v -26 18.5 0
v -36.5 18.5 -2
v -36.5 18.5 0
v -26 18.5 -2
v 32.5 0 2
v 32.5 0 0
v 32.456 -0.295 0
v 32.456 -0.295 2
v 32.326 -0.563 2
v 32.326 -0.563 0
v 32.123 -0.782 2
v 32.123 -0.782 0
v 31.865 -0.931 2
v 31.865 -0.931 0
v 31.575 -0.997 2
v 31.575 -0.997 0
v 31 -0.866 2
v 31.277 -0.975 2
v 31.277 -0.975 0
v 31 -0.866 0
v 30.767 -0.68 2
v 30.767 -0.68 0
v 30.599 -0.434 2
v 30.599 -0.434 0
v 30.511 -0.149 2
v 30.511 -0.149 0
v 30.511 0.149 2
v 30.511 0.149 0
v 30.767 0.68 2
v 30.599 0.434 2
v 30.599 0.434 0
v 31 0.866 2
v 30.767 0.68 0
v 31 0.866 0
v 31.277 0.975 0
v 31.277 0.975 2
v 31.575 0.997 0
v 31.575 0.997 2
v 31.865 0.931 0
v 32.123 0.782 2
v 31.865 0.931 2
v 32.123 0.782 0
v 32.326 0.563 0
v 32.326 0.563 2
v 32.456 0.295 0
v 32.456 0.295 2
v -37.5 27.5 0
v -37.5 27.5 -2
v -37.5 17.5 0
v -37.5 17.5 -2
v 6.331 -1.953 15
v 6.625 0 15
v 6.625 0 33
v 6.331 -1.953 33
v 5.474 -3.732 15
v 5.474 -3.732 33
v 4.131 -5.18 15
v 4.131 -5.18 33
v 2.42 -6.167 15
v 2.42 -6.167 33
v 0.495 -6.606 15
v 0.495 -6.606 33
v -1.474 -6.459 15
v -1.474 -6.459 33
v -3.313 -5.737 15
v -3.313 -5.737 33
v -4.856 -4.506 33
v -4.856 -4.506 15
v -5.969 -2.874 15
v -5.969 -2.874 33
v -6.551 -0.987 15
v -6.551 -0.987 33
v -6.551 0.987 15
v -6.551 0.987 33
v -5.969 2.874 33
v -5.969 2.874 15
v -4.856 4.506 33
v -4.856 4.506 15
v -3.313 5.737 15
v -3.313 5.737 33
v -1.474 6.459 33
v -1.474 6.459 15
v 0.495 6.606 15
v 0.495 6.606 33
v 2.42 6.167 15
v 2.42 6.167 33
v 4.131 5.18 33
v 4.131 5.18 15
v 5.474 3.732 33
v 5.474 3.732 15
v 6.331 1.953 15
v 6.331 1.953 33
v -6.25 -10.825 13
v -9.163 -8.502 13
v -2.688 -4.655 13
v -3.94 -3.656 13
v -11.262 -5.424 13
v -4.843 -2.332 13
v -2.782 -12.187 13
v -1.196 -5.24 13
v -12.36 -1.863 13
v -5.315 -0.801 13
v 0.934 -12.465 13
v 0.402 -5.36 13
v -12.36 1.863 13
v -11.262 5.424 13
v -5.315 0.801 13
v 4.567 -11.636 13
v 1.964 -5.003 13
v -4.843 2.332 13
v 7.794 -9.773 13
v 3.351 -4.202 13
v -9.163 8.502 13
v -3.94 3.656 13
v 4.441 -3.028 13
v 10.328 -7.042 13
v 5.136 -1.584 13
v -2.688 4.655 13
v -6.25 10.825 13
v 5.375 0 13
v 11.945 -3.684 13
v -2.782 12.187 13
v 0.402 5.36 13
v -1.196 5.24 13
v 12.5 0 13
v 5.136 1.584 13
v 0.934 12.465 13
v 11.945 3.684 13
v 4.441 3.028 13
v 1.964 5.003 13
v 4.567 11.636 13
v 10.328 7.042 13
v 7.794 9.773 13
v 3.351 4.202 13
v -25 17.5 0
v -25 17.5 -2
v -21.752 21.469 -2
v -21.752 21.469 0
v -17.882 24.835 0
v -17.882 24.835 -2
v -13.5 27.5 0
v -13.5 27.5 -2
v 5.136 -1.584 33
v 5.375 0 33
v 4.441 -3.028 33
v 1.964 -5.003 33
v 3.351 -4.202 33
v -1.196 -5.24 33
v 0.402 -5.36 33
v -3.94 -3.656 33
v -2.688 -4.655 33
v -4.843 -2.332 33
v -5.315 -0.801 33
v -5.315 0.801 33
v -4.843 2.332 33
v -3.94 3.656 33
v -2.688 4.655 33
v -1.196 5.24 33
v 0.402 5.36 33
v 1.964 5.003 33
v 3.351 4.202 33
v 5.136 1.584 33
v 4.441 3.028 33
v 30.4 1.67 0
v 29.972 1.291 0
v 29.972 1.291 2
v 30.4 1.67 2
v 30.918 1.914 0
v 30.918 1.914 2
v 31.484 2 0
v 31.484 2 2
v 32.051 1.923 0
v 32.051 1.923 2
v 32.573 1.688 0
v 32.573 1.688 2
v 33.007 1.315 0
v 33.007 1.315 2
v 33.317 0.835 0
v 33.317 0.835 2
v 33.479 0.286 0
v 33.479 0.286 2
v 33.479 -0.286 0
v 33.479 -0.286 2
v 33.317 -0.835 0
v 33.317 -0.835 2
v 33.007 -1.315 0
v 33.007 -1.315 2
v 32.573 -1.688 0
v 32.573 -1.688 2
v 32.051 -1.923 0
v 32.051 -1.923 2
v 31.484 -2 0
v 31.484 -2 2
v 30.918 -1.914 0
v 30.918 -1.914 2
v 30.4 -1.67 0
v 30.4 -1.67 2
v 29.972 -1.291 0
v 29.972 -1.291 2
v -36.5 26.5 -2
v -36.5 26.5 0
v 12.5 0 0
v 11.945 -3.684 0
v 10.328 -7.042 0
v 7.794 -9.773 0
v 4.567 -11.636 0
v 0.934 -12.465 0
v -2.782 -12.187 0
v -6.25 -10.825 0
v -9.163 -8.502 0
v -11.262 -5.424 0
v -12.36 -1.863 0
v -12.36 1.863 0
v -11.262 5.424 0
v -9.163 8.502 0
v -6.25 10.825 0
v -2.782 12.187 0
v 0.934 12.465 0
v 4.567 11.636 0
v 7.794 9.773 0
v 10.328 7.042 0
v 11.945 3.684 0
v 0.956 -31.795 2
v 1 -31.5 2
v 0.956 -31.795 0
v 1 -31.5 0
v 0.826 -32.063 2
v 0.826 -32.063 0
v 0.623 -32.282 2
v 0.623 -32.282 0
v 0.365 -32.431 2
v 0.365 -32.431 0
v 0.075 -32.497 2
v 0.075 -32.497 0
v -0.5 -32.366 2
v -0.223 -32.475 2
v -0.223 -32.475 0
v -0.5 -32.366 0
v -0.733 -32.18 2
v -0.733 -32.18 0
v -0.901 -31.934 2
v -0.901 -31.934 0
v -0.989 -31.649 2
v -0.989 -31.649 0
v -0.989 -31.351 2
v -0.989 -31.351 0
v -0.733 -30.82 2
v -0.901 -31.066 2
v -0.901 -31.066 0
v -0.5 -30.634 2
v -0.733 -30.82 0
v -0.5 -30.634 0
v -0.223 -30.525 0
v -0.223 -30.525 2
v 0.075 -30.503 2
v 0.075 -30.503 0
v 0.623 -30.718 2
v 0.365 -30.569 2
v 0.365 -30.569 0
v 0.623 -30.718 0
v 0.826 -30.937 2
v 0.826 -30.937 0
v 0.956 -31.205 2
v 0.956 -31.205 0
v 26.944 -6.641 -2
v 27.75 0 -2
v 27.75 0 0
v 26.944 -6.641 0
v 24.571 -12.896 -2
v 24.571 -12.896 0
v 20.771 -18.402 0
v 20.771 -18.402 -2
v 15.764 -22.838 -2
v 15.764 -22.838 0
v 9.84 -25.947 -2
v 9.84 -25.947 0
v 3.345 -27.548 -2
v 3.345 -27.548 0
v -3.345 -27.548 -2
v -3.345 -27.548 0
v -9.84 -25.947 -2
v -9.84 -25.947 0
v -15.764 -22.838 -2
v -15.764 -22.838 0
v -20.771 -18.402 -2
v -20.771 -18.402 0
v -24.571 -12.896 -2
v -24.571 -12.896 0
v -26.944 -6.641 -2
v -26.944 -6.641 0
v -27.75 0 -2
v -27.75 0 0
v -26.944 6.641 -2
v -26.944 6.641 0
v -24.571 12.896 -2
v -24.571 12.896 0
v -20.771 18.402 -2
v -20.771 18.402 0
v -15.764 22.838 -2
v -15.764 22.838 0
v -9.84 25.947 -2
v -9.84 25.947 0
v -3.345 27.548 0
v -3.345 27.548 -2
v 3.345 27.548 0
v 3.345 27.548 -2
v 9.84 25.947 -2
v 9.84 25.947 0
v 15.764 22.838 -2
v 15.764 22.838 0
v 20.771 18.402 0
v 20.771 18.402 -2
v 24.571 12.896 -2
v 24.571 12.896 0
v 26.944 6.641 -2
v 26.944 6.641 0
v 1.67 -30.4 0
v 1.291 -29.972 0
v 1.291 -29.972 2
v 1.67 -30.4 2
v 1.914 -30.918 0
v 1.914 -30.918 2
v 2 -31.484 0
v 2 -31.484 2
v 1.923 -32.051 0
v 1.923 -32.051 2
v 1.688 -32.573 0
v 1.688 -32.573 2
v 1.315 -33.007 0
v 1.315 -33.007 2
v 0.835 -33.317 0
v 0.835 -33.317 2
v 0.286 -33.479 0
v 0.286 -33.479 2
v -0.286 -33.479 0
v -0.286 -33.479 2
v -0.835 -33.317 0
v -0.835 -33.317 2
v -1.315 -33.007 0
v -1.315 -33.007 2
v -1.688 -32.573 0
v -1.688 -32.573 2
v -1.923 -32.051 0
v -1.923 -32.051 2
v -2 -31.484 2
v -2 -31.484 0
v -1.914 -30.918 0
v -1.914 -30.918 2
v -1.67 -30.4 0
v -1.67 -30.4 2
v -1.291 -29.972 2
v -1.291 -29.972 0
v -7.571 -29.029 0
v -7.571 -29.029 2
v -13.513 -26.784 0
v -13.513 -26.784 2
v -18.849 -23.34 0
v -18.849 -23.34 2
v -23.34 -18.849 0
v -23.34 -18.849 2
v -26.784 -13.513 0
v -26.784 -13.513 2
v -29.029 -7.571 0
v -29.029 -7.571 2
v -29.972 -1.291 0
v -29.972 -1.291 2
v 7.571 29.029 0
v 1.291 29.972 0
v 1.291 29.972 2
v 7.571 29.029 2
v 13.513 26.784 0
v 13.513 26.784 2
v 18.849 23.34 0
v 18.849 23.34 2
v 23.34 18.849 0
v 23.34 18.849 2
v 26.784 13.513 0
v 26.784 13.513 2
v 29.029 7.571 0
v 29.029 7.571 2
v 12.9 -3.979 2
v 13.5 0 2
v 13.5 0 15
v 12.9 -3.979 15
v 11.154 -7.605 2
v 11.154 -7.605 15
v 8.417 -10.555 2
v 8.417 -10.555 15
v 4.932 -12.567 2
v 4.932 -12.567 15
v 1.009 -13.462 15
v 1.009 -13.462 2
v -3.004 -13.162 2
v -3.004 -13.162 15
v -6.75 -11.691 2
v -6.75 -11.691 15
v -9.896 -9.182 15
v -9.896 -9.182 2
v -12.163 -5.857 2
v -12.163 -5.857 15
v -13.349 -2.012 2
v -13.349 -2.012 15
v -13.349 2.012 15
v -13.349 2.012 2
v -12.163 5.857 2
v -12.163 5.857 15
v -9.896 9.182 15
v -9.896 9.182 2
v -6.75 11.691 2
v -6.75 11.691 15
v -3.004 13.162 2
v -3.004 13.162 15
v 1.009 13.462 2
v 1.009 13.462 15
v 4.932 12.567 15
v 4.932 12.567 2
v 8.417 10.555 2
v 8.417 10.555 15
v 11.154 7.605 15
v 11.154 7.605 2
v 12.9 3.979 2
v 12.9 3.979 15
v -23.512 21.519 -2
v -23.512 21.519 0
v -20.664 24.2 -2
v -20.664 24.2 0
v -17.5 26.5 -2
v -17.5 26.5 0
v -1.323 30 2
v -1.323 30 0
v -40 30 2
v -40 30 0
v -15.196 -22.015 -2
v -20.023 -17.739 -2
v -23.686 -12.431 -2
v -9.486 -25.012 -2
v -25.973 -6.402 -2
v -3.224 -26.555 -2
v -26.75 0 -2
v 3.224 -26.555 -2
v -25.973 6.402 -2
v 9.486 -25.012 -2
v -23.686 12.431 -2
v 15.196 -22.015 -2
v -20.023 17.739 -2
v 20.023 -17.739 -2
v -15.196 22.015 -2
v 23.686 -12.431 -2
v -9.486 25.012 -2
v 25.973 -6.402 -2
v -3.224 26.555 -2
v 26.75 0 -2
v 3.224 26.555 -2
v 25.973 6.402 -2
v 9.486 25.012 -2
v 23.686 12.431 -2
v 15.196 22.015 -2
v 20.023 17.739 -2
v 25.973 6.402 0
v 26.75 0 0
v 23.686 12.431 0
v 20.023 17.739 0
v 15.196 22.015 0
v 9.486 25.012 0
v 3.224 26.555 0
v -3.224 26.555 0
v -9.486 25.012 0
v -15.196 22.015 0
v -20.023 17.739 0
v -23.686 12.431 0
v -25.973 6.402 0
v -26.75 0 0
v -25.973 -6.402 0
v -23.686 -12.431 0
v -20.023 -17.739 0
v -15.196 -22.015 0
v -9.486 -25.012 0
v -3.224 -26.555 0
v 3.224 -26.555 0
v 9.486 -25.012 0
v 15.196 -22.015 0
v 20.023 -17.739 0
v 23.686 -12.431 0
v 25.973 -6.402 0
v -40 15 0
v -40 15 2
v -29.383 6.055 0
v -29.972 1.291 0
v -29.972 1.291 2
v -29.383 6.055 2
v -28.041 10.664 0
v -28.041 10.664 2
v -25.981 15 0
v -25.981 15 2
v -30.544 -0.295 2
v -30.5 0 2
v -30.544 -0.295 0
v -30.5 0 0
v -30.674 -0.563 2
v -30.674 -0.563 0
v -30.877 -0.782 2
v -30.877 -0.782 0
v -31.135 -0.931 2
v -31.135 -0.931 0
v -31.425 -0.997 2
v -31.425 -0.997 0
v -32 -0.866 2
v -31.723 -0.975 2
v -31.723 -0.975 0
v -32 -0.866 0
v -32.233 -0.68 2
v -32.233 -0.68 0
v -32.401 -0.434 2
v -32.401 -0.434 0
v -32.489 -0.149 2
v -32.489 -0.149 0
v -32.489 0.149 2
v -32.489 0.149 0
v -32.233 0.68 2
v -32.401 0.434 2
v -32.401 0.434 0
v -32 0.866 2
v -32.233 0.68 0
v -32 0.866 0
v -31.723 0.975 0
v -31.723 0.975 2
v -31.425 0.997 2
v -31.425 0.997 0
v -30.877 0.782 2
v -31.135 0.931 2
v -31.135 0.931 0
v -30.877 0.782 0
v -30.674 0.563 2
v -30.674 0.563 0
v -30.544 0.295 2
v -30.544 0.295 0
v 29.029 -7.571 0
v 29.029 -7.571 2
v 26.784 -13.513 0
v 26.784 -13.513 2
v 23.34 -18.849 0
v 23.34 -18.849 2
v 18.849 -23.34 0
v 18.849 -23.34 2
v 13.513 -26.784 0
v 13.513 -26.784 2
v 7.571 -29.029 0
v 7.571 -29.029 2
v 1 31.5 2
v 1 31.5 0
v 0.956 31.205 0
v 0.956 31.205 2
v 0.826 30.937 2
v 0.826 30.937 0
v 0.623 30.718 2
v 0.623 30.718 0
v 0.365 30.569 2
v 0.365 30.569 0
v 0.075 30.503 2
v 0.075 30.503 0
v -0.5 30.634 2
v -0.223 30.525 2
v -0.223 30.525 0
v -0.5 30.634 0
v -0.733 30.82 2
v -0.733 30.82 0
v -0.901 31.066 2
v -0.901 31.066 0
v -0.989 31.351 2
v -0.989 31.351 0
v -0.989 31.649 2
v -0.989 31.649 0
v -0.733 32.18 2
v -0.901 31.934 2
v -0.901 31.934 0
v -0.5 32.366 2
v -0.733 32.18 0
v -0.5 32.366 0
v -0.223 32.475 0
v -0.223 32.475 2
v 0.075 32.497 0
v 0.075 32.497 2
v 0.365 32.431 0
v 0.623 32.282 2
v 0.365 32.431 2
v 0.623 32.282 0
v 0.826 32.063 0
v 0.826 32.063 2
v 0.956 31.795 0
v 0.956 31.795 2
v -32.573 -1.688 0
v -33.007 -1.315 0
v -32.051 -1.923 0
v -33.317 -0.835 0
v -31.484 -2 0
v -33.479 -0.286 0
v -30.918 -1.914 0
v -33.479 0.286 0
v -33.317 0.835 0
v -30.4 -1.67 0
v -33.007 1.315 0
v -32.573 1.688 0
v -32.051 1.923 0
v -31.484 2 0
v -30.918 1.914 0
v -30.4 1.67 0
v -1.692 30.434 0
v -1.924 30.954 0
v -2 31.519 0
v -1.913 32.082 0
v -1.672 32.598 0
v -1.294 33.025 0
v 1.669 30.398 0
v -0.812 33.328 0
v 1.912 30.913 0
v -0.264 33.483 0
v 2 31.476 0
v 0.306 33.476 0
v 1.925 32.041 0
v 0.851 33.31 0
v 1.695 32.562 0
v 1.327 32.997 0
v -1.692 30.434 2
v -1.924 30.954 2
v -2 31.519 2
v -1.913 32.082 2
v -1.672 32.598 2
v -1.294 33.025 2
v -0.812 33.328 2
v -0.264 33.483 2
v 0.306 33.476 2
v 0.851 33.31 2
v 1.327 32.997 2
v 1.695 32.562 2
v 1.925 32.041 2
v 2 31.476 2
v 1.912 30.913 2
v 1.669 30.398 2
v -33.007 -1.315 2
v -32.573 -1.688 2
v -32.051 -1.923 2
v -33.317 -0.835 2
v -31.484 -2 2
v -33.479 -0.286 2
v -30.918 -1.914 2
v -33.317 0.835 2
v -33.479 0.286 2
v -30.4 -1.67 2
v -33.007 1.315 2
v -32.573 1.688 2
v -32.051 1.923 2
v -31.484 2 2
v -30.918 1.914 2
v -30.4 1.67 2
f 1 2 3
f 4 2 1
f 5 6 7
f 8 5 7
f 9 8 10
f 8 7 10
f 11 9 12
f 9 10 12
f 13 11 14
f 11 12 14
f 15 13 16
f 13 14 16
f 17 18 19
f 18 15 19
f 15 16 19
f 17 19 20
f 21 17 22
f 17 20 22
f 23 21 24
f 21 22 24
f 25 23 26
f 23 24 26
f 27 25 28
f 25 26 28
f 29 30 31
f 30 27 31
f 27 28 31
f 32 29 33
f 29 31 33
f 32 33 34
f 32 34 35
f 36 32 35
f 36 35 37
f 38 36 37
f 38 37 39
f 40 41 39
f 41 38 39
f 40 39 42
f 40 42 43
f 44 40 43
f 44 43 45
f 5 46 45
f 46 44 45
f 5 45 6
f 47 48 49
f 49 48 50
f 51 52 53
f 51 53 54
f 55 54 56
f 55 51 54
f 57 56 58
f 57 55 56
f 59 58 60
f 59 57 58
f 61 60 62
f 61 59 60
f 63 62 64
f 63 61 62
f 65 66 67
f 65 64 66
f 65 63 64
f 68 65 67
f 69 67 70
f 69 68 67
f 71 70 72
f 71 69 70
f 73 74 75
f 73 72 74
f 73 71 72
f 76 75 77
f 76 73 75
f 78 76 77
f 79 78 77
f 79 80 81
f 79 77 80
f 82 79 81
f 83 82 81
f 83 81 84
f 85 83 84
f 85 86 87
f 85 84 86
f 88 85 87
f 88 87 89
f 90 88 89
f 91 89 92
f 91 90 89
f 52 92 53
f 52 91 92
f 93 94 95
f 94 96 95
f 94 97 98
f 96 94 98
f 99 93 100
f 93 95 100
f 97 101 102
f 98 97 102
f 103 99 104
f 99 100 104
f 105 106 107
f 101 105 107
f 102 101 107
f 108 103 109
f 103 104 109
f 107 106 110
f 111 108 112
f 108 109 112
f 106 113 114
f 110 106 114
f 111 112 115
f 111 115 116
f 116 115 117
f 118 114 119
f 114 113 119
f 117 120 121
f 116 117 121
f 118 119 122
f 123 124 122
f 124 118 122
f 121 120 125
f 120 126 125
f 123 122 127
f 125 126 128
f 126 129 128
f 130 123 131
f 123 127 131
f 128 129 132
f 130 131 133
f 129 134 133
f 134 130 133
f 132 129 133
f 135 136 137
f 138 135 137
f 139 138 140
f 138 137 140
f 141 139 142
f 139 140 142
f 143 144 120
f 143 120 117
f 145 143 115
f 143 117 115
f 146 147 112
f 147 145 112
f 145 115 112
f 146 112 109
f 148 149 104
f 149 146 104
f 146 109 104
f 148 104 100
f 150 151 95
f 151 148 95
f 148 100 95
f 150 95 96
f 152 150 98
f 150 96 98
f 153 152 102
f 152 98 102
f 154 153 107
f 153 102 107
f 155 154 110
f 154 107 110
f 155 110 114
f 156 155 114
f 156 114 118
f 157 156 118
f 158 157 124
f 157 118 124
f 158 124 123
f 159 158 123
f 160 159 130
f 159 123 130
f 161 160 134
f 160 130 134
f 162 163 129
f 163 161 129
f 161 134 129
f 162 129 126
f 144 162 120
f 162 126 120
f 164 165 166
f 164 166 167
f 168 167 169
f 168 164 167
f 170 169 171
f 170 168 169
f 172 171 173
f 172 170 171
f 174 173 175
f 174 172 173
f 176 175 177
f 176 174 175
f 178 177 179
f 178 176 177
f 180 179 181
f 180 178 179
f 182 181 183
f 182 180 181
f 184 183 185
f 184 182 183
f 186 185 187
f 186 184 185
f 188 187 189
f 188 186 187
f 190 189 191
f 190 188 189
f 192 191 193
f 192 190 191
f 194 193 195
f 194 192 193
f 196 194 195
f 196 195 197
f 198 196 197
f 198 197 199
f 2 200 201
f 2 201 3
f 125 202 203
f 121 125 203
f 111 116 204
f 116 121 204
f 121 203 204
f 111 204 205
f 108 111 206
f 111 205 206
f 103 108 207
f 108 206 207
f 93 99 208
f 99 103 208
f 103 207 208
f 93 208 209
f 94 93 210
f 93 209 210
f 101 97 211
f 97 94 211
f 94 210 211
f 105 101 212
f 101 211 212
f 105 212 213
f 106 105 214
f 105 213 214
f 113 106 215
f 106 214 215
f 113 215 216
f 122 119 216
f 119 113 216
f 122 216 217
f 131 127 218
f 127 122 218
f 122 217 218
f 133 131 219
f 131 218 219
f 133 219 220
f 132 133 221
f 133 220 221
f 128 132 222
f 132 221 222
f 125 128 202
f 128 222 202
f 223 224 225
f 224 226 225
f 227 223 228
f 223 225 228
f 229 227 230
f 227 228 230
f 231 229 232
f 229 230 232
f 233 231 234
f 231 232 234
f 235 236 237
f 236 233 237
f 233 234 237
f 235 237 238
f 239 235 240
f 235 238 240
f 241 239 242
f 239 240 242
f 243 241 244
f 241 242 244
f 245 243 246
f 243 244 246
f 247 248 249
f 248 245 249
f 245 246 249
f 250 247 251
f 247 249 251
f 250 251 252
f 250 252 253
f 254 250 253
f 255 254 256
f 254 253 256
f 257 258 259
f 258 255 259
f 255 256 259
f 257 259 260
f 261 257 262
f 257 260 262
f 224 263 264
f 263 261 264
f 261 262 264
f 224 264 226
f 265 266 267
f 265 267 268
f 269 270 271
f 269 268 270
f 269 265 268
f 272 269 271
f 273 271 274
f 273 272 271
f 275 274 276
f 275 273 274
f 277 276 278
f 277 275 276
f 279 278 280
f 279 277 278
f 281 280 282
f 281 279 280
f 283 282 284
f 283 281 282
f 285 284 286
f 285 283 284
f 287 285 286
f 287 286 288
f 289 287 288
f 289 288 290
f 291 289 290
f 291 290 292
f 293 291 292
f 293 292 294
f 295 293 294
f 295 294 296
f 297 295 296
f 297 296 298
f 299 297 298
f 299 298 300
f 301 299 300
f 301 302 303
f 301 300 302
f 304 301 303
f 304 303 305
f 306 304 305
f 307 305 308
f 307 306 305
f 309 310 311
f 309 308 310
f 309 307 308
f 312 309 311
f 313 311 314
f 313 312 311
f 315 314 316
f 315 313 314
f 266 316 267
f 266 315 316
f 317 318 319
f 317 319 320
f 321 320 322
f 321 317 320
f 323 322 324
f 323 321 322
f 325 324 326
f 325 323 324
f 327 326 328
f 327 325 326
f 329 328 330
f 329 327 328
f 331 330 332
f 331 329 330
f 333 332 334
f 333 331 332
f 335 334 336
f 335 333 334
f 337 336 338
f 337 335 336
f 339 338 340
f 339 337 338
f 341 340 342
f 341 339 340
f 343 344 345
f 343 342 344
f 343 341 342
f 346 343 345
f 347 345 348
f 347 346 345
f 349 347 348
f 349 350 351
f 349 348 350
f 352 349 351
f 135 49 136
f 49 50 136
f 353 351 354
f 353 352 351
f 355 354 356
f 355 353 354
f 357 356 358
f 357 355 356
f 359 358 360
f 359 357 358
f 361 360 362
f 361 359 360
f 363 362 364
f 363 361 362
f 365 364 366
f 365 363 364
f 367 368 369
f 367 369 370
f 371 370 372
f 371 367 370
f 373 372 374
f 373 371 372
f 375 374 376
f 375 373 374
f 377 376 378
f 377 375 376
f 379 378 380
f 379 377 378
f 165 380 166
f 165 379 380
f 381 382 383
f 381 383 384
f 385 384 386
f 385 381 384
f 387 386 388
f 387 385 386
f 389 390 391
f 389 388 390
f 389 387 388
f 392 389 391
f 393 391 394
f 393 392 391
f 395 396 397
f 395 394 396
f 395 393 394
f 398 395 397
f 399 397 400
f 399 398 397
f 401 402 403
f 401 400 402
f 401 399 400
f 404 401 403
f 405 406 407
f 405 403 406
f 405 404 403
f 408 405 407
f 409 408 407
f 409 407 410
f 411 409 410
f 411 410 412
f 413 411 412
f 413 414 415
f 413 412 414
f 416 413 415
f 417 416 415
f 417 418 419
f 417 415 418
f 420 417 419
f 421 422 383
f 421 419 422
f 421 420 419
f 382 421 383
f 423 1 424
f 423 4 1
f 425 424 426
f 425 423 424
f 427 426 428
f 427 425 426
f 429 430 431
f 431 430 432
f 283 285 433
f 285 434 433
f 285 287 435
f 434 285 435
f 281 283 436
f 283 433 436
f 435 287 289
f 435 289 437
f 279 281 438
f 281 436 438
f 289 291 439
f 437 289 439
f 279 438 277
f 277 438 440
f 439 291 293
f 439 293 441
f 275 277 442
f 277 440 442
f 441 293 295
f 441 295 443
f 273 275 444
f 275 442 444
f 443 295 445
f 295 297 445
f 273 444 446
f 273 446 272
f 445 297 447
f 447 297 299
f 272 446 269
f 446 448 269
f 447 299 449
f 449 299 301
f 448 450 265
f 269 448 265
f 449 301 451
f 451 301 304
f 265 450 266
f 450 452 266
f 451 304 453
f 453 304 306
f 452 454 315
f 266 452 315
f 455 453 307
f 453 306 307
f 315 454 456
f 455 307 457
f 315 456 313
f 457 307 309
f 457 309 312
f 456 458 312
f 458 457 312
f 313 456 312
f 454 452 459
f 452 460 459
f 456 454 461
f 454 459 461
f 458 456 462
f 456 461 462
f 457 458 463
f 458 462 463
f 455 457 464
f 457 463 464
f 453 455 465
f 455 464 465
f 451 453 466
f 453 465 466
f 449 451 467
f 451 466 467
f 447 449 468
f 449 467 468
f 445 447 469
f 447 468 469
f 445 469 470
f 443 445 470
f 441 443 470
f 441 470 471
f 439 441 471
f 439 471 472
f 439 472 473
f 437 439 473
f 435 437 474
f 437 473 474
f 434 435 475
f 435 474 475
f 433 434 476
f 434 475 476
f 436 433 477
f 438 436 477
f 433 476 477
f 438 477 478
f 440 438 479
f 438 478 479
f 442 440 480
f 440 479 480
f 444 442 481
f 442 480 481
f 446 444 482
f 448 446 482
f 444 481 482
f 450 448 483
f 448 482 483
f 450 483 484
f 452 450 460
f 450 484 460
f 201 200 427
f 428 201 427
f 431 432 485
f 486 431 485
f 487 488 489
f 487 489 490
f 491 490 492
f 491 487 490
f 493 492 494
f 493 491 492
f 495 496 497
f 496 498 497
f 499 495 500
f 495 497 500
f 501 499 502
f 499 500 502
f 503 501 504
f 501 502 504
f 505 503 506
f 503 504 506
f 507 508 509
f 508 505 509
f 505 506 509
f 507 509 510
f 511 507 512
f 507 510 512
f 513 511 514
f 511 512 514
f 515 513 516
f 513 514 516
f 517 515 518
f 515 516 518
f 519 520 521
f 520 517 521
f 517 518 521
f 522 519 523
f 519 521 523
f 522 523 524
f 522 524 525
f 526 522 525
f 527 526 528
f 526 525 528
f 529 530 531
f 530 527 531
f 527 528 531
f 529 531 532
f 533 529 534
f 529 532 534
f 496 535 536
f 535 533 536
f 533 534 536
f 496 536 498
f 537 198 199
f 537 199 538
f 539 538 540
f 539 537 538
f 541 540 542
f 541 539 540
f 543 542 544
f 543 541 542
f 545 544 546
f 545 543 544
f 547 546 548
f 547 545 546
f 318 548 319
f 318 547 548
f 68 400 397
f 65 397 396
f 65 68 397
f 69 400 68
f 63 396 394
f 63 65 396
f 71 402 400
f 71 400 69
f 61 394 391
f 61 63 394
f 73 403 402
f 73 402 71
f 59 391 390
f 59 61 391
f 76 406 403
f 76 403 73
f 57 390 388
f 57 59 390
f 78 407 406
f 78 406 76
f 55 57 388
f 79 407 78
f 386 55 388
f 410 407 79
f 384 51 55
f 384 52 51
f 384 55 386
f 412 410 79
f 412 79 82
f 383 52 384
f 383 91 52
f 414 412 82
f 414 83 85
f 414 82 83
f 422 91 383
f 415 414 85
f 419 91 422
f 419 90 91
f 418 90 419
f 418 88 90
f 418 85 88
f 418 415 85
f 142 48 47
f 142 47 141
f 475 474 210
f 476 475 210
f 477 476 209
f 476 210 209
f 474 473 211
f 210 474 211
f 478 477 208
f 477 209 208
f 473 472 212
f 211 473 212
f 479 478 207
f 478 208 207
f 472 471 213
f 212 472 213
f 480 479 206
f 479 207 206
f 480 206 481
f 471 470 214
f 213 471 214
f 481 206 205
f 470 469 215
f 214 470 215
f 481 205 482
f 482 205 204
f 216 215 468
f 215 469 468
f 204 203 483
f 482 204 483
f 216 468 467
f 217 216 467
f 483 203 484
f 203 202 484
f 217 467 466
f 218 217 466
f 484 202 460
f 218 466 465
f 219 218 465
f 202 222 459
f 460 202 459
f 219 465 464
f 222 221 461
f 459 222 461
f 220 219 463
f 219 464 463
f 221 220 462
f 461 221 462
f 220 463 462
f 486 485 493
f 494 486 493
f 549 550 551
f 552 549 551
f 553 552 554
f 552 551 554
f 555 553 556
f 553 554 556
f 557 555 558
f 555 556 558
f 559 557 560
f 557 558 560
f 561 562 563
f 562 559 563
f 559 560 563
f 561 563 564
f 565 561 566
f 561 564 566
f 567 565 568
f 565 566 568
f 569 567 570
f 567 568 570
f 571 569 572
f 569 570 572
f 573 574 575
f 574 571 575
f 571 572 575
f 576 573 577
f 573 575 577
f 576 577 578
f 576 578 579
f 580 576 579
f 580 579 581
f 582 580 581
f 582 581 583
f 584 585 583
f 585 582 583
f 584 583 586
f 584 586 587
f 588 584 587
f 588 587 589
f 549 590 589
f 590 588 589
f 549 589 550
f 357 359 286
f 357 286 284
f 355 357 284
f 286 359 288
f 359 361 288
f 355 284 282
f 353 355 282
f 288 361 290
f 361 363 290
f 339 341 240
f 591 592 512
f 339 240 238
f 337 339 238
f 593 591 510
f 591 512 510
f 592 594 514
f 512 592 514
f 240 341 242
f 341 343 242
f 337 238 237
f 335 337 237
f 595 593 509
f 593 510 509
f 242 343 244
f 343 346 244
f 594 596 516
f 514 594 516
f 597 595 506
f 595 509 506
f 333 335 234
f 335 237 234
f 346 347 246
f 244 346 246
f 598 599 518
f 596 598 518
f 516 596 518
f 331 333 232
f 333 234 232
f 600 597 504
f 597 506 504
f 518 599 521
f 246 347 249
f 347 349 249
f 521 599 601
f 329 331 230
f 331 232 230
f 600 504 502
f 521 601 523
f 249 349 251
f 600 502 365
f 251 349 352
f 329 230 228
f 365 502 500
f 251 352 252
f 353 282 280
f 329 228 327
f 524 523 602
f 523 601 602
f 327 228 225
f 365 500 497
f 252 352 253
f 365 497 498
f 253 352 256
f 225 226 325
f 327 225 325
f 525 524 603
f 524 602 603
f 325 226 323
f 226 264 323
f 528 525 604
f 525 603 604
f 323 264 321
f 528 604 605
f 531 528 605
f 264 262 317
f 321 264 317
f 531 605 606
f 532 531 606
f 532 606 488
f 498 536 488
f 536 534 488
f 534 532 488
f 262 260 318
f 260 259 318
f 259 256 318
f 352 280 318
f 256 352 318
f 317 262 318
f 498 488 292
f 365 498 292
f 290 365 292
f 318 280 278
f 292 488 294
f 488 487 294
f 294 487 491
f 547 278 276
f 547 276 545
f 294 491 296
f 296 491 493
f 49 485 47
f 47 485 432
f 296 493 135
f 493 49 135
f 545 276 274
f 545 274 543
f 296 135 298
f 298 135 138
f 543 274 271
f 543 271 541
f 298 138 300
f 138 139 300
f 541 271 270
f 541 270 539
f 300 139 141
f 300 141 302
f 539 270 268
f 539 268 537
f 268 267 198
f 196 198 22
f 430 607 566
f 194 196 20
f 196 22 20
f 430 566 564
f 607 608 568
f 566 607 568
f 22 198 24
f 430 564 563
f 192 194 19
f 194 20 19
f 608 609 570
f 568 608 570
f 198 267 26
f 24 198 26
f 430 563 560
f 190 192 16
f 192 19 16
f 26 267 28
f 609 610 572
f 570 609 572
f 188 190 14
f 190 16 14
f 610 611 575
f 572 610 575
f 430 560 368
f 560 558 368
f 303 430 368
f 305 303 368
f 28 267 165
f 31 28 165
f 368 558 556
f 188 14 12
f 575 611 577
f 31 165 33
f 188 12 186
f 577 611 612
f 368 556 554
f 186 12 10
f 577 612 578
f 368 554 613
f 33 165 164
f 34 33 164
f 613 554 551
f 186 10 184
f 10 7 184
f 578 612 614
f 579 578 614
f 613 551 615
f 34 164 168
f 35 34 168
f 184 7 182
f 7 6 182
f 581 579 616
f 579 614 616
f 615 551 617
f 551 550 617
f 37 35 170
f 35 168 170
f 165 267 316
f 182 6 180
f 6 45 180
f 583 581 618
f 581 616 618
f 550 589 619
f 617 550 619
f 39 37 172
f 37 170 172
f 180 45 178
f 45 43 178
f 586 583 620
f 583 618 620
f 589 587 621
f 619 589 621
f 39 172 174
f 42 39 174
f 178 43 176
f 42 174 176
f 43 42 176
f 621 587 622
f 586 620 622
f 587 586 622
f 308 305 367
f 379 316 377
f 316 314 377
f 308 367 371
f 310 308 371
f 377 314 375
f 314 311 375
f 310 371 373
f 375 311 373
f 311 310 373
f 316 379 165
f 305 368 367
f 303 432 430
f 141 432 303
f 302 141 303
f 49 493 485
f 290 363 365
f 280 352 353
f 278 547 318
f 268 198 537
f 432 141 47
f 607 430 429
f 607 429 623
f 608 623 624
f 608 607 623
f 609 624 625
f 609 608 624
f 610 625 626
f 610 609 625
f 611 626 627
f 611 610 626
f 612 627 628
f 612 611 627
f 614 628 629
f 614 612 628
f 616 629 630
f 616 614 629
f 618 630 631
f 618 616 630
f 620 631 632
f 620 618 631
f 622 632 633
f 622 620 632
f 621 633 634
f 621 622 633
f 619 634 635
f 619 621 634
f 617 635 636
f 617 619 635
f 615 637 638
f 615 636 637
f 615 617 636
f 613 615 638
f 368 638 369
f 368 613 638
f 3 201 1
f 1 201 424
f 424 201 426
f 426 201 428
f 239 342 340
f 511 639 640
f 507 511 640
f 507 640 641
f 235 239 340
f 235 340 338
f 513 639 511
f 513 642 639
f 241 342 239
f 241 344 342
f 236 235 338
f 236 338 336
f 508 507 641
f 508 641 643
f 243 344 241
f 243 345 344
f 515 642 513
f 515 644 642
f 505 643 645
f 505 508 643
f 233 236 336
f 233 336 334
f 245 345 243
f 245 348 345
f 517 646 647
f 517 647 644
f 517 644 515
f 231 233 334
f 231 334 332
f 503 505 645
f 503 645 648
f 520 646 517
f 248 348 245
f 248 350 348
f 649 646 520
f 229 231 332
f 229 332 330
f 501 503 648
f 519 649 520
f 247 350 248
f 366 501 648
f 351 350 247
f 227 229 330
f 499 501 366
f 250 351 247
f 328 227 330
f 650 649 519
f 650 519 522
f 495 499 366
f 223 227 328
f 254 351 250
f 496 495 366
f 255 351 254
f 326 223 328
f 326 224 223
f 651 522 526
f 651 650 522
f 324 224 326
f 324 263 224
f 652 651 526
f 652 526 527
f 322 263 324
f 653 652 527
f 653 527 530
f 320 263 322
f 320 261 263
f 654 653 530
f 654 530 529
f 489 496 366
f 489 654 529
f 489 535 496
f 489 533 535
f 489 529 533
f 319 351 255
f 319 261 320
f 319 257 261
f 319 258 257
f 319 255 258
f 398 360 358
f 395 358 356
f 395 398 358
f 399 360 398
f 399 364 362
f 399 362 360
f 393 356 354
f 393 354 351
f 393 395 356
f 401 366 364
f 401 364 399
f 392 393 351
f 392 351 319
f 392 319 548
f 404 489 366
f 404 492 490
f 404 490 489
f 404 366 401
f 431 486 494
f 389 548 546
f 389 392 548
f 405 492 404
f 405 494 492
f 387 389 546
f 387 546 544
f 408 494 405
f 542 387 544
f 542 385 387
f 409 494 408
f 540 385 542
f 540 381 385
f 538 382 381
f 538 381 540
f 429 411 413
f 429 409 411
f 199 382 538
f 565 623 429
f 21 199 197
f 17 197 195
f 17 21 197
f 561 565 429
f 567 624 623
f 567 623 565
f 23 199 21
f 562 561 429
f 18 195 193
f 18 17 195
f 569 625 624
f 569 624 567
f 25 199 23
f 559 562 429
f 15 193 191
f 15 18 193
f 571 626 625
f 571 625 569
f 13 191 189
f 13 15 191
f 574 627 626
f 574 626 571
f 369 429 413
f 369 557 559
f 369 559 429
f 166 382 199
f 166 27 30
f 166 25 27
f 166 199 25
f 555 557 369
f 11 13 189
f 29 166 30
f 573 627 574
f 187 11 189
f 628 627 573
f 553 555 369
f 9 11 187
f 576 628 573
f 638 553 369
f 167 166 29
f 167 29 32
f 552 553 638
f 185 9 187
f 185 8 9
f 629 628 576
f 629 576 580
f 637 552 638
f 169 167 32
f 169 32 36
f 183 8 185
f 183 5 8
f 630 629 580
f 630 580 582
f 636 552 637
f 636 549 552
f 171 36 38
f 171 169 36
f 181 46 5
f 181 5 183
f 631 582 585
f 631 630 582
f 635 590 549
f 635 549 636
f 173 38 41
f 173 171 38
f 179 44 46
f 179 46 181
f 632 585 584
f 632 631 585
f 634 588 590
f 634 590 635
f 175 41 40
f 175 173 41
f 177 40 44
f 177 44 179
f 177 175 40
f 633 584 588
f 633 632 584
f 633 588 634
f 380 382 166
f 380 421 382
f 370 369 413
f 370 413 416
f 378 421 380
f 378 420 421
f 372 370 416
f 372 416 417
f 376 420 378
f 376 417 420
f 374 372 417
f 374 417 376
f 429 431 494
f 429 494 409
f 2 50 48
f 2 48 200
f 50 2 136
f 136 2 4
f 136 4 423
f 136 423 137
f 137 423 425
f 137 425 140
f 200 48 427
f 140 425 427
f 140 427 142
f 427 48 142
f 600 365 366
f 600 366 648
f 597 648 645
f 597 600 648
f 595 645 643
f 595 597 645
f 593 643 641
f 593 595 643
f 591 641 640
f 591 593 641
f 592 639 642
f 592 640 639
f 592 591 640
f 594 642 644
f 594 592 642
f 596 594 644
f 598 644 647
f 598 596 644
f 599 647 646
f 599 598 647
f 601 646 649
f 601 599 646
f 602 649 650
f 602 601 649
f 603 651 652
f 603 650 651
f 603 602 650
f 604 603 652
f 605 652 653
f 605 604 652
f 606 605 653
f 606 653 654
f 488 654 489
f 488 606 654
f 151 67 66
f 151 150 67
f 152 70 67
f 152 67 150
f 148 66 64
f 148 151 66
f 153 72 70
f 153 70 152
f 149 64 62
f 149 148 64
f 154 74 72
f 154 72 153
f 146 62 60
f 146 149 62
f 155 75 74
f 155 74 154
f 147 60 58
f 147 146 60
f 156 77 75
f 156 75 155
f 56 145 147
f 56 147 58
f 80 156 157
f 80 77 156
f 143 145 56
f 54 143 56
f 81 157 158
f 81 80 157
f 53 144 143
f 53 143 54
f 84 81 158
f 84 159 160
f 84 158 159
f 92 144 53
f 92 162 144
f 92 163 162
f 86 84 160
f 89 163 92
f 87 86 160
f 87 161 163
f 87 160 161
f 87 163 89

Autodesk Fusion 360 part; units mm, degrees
sketch "Skizze1" plane through (0, 0, 0) normal (0, 0, 1) x (1, 0, 0)
  line L0 (-40, 17) -> (0, 17)
  line L1 (0, 30) -> (-40, 30)
  line L2 (-40, 15) -> (0, 15)
  circle A0 centre (0, 31.5) radius 2
  line L3 (-40, 28) -> (0, 28)
  circle A1 centre (0, 0) radius 30
  circle A2 centre (0, 31.5) radius 1
  line L4 (0, 15) -> (0, 30)
  line L5 (-40, 15) -> (-40, 17)
  line L6 (-40, 30) -> (-40, 15)
  circle A3 centre (-31.5, 0) radius 1
  circle A4 centre (0, -31.5) radius 2
  circle A5 centre (31.5, 0) radius 2
  circle A6 centre (31.5, 0) radius 1
  circle A7 centre (0, 0) radius 28
  circle A8 centre (0, -31.5) radius 1
  line L7 (-40, 30) -> (-40, 28)
  circle A9 centre (-31.5, 0) radius 2
  line L8 (-38, 28) -> (-38, 17)
  line L9 (-38, 27.5) -> (-37.5, 27.5)
  line L10 (-37.5, 27.5) -> (-37.5, 17.5)
  line L11 (-37.5, 17.5) -> (-25, 17.5)
  line L12 (-37.5, 27.5) -> (-13.5, 27.5)
  arc A10 (-13.5, 27.5) -> (-25, 17.5) centre (0.0202, 0.3392) ccw
  line L13 (-36.5, 26.5) -> (-17.5, 26.5)
  line L14 (-36.5, 26.5) -> (-36.5, 18.5)
  line L15 (-36.5, 18.5) -> (-26, 18.5)
  arc A11 (-17.5, 26.5) -> (-26, 18.5) centre (-0.9044, 0.3515) ccw
  circle A12 centre (0, 0) radius 27.75
  circle A13 centre (0, 0) radius 26.75
  circle A14 centre (0, 0) radius 6.625
  circle A15 centre (0, 0) radius 5.375
  circle A16 centre (0, 0) radius 12.5
  circle A17 centre (0, 0) radius 13.5
  dimension "d1" = 60
  dimension "d7" = 2
  dimension "d8" = 4
  dimension "d9" = 2
  dimension "d10" = 4
  dimension "d11" = 2
  dimension "d12" = 4
  dimension "d13" = 2
  dimension "d14" = 4
  dimension "d15" = 40
  dimension "d16" = 15
  dimension "d17" = 2
  dimension "d18" = 56
  dimension "d19" = 2
  dimension "d20" = 0.5
  dimension "d21" = 55.5
  dimension "d22" = 53.5
  dimension "d29" = 13.25
  dimension "d30" = 10.75
  dimension "d39" = 25
  dimension "d40" = 27
extrude "Extrusion3" add sketch "Skizze1" along normal blind 2 contours L0 L3 L6 L8 | L0 L2 A1 L5 L6 | L0 L3 A1 L8 | L1 A0 L3 A1 L6 L7 | L0 L3 A1 A7 | L0 L2 A1 A7 | L2 A0 A1 L4 A4 A5 A7 A9 | L0 L4 A7 A12 | L0 L2 A7 A12 | A0 L3 A1 L4 | L2 L4 A7 A12 | A1 A9 | A1 A9 | L1 A0 A1 | L1 A0 A1 | A0 A1 L4 | A0 A1 L4 | L0 L4 A13 | L0 L2 L4 A13 | L2 L4 A13 | A1 A4 | A1 A4 | A1 A5 | A1 A5 | L13 L14 L15 A11 makes body 1 at (-33, 21.1667, 0) makes body 2 at (-34.4936, 15.8333, 2) makes body 3 at (22.1835, -1.9997, 0)
extrude "Extrusion4" add sketch "Skizze1" along normal blind 2 and the other way blind 2 contours L10 L11 L12 A10 | L0 L4 A12 A13 | L0 L2 A12 A13 | L2 L4 A12 A13 bodies 1 2 3
extrude "Extrusion6" add sketch "Skizze1" along normal blind 15 contours A17 bodies 1
extrude "Extrusion7" add sketch "Skizze1" along normal blind 2 from surface at 13 contours A16 bodies 1
extrude "Extrusion8" add sketch "Skizze1" along normal blind 20 from surface at 13 contours A14 bodies 1
